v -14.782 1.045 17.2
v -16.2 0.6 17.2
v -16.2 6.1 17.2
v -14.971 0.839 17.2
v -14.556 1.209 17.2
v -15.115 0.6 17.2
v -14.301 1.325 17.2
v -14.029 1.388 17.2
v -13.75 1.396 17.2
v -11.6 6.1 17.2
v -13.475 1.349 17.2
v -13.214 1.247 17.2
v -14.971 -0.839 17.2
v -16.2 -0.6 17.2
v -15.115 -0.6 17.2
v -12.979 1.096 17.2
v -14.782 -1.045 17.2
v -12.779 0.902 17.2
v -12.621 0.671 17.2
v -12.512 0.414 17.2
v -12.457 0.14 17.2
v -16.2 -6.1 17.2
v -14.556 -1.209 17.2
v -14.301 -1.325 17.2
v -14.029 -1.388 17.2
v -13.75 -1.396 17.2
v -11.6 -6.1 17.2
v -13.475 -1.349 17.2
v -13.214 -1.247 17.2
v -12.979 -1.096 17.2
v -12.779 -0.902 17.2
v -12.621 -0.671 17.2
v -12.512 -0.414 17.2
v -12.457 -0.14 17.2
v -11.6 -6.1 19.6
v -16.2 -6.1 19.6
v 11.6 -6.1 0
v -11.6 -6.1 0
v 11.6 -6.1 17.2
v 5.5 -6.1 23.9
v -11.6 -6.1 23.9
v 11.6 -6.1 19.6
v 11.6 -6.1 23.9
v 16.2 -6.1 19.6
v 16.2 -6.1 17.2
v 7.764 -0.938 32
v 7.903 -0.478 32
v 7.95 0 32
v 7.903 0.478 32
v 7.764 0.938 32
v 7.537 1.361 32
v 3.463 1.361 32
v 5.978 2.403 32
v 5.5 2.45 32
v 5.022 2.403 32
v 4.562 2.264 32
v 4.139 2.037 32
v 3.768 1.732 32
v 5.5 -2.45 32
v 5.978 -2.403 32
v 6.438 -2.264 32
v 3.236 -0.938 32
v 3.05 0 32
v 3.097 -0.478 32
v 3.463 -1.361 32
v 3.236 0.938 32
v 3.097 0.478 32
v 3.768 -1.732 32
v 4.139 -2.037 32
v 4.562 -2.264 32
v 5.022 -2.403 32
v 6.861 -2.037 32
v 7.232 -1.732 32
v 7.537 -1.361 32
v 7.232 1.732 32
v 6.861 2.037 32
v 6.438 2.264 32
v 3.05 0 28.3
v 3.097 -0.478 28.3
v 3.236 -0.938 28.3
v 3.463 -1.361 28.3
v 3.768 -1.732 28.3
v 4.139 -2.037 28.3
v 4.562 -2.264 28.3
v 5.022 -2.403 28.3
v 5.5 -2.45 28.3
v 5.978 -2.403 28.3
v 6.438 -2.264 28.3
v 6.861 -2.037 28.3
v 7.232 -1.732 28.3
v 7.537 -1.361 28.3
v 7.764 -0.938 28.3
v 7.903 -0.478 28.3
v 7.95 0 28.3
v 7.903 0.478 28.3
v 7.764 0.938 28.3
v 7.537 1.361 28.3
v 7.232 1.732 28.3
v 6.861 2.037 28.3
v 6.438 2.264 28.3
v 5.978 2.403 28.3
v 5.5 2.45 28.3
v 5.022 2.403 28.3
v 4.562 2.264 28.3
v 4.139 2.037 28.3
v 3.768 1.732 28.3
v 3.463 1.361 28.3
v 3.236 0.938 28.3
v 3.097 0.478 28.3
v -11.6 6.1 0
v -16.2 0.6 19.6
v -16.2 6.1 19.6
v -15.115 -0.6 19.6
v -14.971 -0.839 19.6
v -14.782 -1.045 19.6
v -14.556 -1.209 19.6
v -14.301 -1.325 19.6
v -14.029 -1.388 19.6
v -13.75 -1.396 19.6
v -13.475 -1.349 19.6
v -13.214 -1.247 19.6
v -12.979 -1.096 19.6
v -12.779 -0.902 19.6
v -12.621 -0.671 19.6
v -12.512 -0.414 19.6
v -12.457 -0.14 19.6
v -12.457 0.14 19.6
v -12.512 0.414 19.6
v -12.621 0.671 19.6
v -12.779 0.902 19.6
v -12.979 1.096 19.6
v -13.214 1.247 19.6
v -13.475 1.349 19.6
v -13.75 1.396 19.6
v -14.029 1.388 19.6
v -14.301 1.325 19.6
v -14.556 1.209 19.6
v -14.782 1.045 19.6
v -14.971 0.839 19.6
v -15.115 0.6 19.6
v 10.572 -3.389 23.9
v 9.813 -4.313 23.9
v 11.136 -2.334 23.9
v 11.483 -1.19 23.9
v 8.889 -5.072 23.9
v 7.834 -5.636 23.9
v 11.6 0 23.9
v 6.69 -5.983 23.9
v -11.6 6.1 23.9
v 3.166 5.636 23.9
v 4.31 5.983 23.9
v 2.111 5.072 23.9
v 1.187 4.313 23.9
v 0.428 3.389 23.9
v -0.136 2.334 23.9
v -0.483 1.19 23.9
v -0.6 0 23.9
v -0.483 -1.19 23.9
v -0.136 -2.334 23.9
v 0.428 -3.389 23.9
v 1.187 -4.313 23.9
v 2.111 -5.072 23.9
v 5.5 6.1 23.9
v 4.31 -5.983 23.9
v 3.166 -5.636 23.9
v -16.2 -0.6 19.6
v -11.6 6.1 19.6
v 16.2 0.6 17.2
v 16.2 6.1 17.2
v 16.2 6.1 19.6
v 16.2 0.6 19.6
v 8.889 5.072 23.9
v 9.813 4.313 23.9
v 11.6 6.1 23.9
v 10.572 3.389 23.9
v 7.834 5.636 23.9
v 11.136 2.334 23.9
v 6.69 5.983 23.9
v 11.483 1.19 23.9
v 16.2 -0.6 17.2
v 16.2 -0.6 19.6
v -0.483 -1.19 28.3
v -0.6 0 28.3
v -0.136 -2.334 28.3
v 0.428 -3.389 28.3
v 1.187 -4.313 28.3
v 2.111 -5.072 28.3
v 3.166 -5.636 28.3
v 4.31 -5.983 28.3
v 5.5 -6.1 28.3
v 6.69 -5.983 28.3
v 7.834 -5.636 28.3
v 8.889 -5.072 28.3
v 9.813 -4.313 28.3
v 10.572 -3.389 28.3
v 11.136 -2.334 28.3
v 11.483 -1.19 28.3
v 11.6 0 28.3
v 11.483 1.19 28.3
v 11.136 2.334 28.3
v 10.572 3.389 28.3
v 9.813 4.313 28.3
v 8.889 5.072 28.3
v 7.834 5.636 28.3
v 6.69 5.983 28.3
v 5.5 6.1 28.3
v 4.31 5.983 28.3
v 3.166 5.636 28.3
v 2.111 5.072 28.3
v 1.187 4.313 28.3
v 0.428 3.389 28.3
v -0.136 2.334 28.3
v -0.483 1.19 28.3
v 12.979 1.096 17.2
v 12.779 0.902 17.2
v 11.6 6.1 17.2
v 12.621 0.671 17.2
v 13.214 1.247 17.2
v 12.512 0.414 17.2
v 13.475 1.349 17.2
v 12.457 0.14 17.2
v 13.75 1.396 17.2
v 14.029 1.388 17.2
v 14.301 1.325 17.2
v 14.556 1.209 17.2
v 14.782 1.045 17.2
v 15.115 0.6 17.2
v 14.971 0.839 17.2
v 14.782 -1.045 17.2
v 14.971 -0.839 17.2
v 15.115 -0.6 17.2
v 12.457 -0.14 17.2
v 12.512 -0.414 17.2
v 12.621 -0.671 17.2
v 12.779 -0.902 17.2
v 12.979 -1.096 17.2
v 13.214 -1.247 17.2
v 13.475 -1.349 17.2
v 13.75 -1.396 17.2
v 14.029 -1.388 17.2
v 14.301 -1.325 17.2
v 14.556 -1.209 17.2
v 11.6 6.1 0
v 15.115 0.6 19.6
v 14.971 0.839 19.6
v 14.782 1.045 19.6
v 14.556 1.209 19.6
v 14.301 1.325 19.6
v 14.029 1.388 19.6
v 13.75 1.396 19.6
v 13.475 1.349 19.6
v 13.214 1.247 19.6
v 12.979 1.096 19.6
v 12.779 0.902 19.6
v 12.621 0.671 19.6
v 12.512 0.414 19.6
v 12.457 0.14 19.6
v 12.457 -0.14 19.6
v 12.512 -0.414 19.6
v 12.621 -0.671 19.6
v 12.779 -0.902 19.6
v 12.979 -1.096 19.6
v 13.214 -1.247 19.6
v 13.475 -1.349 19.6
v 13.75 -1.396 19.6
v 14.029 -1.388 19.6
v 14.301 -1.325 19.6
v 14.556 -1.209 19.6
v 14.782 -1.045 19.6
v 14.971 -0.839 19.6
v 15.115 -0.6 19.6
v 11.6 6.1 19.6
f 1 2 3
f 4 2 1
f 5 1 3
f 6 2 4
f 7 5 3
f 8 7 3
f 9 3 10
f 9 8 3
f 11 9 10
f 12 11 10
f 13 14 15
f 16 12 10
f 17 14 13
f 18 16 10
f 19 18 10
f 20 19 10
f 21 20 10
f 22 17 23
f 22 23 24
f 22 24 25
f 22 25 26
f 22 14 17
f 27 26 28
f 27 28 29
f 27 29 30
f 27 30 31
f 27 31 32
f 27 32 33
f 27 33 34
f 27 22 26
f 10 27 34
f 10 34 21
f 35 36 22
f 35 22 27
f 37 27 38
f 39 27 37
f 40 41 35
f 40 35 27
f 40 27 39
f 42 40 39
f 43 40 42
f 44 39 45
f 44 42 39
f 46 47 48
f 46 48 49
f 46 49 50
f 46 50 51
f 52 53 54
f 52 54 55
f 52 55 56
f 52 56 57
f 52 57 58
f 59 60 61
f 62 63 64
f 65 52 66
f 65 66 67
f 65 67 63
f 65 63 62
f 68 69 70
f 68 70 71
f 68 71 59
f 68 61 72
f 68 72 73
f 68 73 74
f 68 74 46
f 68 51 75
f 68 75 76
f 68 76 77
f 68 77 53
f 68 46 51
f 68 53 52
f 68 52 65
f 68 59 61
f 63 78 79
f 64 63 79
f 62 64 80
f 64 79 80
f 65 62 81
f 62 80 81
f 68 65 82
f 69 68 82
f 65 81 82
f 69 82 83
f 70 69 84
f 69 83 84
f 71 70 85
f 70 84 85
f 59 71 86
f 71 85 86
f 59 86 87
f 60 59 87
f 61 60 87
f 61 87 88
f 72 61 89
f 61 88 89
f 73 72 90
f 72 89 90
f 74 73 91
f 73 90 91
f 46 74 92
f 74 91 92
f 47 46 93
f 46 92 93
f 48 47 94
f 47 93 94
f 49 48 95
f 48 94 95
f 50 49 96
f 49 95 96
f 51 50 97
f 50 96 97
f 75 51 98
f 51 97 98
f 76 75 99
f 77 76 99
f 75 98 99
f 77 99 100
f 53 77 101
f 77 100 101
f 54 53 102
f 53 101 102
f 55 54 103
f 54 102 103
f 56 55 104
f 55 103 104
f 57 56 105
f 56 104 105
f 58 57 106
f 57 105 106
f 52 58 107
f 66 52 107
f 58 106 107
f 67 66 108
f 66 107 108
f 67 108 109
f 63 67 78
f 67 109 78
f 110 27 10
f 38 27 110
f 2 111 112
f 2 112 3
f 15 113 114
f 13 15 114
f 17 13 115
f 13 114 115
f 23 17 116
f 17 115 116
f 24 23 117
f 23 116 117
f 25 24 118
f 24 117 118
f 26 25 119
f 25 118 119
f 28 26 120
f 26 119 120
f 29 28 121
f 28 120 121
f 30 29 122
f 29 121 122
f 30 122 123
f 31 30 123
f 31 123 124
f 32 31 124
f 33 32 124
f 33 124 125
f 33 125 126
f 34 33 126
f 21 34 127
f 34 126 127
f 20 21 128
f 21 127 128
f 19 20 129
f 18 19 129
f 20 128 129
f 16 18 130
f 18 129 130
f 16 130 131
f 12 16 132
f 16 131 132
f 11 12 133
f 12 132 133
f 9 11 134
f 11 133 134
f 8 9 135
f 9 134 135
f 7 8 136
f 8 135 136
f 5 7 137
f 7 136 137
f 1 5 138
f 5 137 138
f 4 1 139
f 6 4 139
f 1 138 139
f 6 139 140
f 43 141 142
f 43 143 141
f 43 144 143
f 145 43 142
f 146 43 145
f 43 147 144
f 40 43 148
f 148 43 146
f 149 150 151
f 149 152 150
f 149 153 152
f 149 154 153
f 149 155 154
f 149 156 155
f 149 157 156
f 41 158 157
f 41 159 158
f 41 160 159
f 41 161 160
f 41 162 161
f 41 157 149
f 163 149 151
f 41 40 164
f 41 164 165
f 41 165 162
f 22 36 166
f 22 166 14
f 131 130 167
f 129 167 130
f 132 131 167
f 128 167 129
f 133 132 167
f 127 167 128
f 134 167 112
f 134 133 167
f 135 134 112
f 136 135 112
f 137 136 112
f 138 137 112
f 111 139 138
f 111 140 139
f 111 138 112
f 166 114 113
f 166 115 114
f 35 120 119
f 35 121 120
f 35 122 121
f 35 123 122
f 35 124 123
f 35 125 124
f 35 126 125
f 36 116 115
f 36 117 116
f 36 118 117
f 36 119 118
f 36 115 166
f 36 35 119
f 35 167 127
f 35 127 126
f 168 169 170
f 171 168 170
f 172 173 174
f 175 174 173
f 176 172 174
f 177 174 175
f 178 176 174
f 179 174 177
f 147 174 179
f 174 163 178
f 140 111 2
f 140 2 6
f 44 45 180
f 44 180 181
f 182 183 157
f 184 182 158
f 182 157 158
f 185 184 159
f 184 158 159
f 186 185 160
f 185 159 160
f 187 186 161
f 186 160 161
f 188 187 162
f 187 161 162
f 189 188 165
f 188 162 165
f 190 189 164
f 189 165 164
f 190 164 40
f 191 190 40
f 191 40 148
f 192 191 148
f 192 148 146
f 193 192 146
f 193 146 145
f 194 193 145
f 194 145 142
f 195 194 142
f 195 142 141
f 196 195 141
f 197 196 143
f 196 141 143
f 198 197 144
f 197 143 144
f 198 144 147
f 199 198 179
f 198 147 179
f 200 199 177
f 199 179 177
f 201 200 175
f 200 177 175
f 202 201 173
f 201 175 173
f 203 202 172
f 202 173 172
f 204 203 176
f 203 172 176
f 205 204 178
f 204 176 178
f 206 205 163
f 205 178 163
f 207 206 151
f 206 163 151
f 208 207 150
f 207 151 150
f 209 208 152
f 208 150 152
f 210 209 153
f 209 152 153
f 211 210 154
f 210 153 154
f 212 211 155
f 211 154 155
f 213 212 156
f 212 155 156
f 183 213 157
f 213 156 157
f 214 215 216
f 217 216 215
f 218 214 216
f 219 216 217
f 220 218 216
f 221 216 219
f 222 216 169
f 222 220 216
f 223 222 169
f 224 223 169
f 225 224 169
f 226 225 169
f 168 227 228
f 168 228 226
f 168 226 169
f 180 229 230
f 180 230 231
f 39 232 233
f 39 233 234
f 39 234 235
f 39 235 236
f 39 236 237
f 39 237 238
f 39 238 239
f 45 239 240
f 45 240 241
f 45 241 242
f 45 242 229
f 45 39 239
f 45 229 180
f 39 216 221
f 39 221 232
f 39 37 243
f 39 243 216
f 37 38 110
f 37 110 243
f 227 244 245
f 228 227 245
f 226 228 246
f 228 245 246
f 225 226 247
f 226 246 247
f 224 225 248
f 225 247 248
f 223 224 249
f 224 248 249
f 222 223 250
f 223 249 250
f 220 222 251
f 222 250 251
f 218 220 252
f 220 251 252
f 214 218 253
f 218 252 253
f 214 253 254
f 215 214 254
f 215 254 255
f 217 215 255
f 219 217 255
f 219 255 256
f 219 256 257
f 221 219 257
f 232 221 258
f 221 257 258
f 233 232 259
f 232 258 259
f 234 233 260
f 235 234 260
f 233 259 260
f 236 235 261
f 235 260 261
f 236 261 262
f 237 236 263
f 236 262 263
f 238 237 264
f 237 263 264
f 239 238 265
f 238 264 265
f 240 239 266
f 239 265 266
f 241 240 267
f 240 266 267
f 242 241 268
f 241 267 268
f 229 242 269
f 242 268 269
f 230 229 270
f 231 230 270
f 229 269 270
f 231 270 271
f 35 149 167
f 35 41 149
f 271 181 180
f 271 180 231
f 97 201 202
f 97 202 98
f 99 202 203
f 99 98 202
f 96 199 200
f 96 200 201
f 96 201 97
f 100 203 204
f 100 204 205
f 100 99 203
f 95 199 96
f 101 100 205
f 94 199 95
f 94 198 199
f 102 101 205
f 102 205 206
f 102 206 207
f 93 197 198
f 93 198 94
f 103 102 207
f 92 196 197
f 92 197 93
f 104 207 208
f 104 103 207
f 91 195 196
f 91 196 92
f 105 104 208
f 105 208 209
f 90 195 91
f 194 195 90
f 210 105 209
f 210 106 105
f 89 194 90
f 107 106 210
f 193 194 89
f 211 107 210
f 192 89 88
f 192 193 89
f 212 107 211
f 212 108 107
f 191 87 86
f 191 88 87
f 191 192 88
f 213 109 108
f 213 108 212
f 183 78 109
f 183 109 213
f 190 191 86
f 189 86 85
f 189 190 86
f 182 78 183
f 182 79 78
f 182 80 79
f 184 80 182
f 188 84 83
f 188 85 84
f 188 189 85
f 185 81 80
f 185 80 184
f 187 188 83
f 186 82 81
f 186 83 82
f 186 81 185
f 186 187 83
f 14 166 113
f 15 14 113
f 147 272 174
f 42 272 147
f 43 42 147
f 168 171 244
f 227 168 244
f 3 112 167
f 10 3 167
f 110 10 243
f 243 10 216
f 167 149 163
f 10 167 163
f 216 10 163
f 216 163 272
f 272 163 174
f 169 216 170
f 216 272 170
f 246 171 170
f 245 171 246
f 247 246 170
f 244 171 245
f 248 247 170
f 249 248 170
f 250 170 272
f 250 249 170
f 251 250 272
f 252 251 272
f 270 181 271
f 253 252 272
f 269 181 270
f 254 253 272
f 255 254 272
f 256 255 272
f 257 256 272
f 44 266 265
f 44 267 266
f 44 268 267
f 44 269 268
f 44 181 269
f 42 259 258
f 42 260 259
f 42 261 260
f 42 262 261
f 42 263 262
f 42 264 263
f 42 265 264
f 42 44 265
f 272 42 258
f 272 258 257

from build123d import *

# Parameters (mm, degrees)
PAD_DEPTH    = 6.1
POCKET_DEPTH = 2.4
SKETCH002_R  = 6.1
PAD001_DEPTH = 4.4
SKETCH003_R  = 2.45
PAD002_DEPTH = 3.7


with BuildPart() as part:
    # Sketch → Pad (new body, symmetric)
    with BuildSketch(Plane.XZ):
        Polygon((-11.6, 23.9), (-11.6, 19.6), (-16.2, 19.6), (-16.2, 17.2), (-11.6, 17.2), (-11.6, 0), (11.6, 0), (11.6, 17.2), (16.2, 17.2), (16.2, 19.6), (11.6, 19.6), (11.6, 23.9), align=None)
    extrude(amount=PAD_DEPTH, both=True)

    # Sketch001 (on Face2 of Pad) → Pocket (cut)
    with BuildSketch(Plane(origin=(0, 0, 19.6), x_dir=(-1, 0, 0), z_dir=(0, 0, 1))):
        with BuildLine():
            Line((-16.2, 0.6), (-15.114911, 0.6))
            ThreePointArc((-15.114911, -0.6), (-12.45, 0), (-15.114911, 0.6))
            Line((-16.2, -0.6), (-15.114911, -0.6))
            Line((-16.2, 0.6), (-16.2, -0.6))
        make_face()
        with BuildLine():
            Line((16.2, 0.6), (15.114911, 0.6))
            ThreePointArc((15.114911, 0.6), (12.45, 0), (15.114911, -0.6))
            Line((16.2, -0.6), (15.114911, -0.6))
            Line((16.2, 0.6), (16.2, -0.6))
        make_face()
    extrude(amount=-POCKET_DEPTH, mode=Mode.SUBTRACT)

    # Sketch002 (on Face2 of Pocket) → Pad001 (join)
    with BuildSketch(Plane(origin=(0, 0, 23.9), x_dir=(-1, 0, 0), z_dir=(0, 0, 1))):
        with Locations((-5.5, 0)):
            Circle(SKETCH002_R)
    extrude(amount=PAD001_DEPTH)

    # Sketch003 (on Face23 of Pad001) → Pad002 (join)
    with BuildSketch(Plane(origin=(0, 0, 28.3), x_dir=(-1, 0, 0), z_dir=(0, 0, 1))):
        with Locations((-5.5, 0)):
            Circle(SKETCH003_R)
    extrude(amount=PAD002_DEPTH)


solid = part.part
